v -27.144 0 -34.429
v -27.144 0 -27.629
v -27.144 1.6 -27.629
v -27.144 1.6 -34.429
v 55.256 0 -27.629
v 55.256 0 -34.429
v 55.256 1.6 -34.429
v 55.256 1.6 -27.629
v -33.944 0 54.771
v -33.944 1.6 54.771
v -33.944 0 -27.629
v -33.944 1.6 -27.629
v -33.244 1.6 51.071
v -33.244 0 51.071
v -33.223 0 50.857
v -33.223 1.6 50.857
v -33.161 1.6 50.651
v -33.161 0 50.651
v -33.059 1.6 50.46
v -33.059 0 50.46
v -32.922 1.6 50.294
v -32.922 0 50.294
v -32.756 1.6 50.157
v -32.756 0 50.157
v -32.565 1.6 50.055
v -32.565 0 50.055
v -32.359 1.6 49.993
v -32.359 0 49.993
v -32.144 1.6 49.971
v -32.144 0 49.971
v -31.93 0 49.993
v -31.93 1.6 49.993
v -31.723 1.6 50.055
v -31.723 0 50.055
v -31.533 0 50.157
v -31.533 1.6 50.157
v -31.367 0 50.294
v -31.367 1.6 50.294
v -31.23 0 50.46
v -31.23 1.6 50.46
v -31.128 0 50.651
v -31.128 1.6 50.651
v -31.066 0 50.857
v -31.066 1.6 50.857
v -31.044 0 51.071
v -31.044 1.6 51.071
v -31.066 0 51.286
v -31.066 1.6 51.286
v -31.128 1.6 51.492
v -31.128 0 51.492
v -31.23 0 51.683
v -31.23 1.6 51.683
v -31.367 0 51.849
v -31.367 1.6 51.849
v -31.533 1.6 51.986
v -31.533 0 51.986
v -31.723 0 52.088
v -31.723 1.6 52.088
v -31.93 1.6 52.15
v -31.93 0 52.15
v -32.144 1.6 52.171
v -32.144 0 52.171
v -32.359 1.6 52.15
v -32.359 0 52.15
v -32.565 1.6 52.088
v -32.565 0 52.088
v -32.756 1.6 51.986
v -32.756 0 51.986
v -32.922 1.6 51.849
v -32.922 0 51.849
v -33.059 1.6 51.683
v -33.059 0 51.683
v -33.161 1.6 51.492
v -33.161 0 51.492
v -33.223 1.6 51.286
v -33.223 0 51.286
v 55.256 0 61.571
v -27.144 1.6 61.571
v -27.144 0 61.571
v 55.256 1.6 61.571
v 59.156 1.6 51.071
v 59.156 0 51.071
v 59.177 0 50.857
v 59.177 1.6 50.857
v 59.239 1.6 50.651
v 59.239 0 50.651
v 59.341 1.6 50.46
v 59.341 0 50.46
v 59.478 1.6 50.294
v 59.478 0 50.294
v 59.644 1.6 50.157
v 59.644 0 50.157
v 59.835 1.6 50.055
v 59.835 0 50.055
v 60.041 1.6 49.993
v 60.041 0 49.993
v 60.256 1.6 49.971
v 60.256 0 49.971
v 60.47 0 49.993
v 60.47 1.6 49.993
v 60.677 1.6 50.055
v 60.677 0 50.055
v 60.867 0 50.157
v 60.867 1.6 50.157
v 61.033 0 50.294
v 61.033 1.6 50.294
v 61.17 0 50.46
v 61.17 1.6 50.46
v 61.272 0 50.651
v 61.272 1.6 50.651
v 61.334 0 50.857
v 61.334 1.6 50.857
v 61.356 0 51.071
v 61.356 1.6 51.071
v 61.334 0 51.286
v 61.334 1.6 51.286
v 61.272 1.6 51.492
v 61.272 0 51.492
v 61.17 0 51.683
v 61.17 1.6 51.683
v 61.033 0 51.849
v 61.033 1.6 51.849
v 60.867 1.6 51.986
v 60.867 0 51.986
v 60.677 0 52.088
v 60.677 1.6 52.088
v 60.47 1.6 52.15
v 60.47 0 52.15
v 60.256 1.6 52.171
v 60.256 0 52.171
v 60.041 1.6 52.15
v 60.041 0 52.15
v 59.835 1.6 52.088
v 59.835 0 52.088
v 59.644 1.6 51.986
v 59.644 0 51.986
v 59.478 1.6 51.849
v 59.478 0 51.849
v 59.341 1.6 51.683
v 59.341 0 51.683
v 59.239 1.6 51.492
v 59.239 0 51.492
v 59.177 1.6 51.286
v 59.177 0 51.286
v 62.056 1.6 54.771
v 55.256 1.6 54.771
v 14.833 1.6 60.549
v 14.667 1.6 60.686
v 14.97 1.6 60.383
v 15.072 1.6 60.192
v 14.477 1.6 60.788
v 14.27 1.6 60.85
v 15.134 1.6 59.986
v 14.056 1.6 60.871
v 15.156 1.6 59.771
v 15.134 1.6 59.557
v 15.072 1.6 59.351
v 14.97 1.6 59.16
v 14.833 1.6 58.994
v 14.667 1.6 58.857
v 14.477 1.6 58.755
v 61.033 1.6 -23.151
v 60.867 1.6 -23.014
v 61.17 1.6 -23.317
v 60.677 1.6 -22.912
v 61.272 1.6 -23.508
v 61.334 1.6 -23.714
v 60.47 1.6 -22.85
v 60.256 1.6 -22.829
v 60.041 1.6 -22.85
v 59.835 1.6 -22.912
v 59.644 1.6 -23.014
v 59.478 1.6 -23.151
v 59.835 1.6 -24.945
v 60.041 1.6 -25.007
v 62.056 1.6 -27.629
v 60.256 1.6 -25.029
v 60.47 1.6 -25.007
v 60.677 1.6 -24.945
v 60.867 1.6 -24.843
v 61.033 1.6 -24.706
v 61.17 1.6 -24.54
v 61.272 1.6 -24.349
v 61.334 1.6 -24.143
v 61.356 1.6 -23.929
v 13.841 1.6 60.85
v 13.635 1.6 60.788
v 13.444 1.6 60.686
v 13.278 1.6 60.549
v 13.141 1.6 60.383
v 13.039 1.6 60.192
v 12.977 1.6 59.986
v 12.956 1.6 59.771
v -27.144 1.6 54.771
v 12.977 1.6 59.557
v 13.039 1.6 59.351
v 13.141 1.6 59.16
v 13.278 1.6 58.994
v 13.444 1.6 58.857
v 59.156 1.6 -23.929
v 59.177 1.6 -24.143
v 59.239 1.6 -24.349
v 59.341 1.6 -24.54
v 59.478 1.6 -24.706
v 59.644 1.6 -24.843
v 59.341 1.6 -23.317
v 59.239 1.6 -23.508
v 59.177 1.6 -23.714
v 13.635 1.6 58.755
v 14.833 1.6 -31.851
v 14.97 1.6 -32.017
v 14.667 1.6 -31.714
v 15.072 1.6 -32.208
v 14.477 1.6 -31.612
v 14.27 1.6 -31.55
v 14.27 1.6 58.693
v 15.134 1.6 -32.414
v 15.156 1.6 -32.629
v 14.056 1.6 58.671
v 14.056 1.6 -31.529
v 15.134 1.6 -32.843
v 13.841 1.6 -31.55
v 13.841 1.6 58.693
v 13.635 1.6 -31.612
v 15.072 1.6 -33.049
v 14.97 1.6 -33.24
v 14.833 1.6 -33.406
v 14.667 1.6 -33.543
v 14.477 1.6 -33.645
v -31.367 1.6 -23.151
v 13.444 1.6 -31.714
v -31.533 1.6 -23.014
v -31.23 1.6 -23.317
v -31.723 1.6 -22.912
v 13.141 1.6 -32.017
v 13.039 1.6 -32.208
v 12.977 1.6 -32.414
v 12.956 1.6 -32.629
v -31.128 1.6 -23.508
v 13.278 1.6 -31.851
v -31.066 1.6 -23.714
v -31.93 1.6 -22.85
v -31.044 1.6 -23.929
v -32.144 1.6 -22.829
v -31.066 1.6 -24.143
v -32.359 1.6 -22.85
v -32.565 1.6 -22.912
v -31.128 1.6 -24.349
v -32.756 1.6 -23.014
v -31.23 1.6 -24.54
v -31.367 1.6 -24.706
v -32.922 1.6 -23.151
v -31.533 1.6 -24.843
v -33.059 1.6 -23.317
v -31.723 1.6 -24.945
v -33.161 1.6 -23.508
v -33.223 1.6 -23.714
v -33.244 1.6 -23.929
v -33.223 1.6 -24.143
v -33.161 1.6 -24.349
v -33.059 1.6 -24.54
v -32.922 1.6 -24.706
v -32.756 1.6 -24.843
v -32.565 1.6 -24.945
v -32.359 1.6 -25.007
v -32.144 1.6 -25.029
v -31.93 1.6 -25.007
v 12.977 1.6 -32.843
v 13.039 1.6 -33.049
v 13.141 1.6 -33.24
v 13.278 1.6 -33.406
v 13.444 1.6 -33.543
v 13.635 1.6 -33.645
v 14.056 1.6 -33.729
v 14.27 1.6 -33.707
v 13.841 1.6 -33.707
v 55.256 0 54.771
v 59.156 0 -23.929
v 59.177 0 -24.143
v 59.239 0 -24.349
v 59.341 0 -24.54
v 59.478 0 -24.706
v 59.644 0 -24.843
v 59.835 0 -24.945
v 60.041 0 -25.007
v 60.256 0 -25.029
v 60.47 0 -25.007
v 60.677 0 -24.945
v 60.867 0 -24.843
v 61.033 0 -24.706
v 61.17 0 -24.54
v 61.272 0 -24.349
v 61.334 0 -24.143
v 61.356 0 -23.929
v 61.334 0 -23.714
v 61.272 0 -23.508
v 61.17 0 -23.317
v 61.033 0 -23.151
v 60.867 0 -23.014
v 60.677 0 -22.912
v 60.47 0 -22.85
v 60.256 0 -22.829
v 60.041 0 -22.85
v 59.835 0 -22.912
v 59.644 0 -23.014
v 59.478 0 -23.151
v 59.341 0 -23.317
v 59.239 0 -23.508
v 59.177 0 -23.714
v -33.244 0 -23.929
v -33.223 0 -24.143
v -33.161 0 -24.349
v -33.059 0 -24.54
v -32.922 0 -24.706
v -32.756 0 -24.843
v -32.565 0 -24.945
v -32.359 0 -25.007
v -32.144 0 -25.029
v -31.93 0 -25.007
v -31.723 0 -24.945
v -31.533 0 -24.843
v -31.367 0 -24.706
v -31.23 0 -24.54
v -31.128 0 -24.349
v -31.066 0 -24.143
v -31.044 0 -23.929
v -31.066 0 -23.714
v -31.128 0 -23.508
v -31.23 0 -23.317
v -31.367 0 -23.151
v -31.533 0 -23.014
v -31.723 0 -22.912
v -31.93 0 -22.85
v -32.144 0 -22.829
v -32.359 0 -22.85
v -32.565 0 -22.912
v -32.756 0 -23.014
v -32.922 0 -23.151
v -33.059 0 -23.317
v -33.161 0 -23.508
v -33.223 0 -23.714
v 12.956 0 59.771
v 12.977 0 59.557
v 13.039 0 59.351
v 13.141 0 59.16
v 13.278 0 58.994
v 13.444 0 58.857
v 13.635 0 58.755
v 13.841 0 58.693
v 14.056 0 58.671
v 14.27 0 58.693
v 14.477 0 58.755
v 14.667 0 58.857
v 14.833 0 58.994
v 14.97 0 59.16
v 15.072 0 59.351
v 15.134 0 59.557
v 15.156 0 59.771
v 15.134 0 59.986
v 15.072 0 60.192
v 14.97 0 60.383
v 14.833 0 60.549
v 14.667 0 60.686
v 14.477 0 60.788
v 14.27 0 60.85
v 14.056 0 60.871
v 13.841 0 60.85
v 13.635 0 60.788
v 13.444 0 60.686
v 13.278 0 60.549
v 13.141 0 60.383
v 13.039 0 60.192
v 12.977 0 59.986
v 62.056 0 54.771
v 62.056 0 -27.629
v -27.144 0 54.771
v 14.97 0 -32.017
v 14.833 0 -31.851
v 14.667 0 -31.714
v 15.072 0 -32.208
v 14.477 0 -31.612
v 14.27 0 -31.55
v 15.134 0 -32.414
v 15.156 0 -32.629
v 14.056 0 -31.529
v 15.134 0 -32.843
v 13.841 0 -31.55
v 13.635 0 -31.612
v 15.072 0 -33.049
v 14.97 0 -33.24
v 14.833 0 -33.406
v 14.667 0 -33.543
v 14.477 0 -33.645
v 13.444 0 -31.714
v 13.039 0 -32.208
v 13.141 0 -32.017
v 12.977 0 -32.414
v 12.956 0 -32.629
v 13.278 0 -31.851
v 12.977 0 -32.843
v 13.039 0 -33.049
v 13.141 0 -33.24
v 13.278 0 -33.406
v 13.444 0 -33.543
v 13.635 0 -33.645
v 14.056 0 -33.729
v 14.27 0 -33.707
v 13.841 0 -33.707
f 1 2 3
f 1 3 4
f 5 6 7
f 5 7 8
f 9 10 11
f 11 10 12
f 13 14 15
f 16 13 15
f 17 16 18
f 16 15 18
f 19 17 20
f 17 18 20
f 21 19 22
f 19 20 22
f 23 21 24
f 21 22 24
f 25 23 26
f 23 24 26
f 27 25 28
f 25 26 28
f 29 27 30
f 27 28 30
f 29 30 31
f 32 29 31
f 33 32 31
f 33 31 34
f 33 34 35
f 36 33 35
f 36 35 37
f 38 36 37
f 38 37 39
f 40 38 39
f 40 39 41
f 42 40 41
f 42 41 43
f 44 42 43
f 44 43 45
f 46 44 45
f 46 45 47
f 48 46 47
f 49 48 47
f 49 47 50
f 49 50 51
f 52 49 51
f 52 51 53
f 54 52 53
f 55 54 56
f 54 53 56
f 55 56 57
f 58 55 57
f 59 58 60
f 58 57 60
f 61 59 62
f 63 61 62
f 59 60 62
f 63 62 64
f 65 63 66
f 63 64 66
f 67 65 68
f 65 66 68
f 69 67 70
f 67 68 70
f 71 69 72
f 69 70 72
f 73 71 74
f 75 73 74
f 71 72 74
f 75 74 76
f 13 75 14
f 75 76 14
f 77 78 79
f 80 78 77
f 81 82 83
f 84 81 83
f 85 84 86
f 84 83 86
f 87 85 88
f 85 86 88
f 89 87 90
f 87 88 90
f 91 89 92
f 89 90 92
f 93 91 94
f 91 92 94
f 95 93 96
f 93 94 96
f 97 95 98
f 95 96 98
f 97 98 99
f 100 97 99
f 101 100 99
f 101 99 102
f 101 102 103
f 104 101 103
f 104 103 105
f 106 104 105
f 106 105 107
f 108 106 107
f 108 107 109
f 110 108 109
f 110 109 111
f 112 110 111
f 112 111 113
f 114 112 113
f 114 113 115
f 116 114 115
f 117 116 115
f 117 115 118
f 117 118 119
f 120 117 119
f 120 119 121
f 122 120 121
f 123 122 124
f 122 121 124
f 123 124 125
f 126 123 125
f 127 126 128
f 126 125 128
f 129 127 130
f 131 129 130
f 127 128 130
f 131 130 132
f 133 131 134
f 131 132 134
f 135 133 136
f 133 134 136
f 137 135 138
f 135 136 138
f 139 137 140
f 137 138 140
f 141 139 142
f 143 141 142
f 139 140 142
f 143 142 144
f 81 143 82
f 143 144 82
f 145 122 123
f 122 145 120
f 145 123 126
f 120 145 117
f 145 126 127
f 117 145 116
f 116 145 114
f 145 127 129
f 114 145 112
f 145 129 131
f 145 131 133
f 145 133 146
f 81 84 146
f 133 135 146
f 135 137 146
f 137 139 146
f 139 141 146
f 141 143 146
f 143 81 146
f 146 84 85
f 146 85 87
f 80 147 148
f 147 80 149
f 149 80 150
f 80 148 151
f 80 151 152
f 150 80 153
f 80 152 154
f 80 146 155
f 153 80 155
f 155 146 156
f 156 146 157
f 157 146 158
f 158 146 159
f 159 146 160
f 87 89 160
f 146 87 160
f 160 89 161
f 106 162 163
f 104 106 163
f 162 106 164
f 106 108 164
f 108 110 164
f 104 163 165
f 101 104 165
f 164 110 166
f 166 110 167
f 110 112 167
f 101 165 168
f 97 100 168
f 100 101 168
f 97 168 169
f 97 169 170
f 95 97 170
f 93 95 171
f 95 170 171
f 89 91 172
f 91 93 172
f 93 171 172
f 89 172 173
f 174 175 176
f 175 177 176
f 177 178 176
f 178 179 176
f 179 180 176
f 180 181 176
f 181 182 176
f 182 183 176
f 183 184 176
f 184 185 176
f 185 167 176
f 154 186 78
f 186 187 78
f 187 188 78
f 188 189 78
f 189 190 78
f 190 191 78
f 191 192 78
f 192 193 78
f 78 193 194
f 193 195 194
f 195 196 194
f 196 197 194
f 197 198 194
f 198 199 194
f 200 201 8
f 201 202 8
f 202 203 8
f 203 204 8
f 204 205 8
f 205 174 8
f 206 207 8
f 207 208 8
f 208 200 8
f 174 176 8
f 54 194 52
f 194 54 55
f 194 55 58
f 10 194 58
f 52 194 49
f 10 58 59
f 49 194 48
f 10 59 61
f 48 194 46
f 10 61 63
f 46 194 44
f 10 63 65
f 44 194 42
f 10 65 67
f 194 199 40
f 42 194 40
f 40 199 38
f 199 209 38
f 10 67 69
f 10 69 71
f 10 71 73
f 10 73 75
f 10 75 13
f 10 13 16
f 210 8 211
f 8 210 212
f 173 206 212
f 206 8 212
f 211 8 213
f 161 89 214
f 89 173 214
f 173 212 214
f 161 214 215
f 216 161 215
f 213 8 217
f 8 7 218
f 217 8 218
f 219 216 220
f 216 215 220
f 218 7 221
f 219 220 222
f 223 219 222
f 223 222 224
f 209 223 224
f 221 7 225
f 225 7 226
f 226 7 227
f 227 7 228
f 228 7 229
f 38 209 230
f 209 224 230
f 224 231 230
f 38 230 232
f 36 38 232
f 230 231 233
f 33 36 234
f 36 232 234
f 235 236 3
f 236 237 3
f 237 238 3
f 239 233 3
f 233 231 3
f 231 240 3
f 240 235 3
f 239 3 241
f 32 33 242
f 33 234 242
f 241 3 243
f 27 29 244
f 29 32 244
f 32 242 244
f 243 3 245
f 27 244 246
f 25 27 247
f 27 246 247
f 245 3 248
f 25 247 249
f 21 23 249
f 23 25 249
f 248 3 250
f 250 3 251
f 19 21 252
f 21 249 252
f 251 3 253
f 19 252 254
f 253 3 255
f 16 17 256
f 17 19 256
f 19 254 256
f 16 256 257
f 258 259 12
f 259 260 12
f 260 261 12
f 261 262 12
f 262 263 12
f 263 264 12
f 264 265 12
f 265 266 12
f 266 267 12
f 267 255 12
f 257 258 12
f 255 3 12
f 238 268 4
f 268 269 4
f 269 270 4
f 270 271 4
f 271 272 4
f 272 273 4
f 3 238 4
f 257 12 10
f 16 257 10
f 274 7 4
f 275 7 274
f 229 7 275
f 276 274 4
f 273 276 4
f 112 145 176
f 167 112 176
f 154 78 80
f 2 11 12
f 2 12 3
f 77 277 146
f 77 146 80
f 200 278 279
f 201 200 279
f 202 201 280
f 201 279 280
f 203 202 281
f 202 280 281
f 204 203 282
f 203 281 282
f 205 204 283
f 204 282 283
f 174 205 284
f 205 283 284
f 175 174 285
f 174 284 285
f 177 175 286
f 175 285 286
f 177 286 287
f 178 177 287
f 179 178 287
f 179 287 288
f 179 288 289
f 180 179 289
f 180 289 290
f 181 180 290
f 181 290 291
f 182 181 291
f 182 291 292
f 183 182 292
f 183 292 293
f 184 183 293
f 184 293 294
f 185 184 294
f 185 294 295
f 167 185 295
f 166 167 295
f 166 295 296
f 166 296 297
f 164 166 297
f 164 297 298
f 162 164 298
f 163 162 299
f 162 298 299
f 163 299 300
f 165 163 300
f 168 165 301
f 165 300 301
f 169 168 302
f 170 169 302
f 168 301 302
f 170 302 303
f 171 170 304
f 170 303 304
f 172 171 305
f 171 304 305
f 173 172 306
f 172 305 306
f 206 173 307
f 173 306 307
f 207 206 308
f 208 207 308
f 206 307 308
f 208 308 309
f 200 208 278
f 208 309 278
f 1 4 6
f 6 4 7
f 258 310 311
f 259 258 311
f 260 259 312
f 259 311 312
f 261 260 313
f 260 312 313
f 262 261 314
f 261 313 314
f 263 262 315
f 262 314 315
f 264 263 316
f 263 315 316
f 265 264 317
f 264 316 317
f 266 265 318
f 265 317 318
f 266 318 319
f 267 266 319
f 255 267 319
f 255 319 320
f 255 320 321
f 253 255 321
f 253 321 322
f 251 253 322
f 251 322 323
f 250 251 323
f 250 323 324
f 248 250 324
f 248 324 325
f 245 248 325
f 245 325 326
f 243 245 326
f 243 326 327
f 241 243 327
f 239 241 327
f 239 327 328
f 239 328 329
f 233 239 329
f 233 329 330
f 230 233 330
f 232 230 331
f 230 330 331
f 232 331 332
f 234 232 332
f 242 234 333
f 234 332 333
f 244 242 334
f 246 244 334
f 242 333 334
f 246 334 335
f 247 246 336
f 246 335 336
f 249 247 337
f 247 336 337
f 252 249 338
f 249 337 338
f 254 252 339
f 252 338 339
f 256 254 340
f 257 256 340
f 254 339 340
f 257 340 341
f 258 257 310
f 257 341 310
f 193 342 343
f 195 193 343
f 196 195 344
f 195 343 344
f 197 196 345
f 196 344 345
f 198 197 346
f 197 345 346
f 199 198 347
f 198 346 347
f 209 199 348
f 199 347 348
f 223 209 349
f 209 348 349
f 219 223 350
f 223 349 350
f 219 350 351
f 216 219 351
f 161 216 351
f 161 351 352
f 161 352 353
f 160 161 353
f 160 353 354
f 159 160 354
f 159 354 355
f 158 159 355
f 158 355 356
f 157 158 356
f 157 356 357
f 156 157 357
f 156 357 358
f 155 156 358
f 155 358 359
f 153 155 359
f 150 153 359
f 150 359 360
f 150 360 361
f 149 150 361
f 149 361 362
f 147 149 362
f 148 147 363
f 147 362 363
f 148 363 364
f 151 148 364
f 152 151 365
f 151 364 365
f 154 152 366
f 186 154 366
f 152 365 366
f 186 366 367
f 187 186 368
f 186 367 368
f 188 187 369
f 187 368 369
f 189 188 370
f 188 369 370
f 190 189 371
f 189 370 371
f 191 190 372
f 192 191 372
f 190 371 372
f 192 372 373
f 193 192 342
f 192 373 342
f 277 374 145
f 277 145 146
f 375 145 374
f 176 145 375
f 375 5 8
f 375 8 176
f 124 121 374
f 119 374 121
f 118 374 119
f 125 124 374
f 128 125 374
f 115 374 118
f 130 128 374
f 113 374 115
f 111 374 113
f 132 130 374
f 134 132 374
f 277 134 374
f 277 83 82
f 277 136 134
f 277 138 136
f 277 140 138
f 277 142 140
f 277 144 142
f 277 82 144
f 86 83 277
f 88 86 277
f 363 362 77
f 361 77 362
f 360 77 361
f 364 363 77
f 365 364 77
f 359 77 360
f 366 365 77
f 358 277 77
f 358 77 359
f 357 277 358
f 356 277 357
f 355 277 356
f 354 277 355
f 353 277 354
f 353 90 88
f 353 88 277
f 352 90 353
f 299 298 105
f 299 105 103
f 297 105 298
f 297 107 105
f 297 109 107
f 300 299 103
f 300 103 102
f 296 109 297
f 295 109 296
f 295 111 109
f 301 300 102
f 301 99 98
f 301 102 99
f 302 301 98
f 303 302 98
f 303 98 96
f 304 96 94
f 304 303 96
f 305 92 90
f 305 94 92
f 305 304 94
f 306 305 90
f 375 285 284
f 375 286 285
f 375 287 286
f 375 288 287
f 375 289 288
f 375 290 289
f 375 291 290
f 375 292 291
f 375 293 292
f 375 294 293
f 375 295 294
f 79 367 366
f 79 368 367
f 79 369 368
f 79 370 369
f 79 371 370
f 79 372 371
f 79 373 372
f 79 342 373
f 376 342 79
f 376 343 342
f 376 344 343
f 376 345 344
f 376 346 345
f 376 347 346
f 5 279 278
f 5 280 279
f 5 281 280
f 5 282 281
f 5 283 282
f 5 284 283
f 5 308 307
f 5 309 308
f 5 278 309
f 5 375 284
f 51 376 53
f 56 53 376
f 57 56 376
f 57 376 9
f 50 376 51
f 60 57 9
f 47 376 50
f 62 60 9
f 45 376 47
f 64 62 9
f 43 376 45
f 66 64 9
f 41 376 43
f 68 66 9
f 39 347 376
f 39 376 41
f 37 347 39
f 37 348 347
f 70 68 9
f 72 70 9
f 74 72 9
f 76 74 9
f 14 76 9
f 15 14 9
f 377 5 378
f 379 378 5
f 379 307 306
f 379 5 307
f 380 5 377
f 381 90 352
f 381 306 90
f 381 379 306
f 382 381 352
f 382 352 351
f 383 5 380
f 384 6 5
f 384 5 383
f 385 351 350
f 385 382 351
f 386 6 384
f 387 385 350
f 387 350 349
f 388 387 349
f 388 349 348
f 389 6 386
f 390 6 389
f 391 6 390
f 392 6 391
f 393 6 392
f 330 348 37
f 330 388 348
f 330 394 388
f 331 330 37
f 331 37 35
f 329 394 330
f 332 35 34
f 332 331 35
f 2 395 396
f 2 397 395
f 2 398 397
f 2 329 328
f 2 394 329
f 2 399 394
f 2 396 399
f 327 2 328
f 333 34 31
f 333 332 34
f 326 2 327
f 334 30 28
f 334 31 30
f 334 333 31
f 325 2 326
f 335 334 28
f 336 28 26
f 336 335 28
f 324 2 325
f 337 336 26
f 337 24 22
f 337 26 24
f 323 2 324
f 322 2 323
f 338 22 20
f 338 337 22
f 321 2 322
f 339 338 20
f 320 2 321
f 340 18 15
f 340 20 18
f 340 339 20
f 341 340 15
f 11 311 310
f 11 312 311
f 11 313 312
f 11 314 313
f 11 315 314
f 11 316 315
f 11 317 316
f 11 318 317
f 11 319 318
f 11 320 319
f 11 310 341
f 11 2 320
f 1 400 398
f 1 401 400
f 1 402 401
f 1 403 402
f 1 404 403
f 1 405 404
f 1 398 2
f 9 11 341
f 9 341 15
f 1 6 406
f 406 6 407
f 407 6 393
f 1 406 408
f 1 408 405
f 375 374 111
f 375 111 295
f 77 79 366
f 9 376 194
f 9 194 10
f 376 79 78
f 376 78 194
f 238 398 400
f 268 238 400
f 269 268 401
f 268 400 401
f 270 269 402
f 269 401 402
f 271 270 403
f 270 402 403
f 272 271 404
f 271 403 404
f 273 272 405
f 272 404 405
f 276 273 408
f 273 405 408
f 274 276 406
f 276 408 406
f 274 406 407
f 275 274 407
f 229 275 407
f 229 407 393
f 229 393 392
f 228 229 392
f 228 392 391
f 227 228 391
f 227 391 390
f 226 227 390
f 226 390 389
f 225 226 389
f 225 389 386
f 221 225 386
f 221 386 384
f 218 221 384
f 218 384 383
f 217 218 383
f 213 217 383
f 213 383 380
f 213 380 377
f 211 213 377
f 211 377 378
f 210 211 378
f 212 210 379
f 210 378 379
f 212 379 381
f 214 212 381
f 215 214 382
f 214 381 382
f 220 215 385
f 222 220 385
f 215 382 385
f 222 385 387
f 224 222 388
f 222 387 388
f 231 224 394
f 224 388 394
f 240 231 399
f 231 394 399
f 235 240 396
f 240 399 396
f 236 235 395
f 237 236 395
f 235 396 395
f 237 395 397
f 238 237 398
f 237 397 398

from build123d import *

# Parameters (mm, degrees)
BOSS_EXTRUDE1_DEPTH            = 1.6
F_2_2_2_2_DIAMETER_HOLE1_D     = 2.2
F_2_2_2_2_DIAMETER_HOLE1_DEPTH = 5
SKETCH8_W                      = 82.4
SKETCH8_H                      = 0.2
SKETCH8_W_2                    = 0.2
SKETCH8_H_2                    = 82.4
EXTRUDE1_DEPTH                 = 2.6


with BuildPart() as part:
    # Sketch1 → Boss-Extrude1 (new body)
    with BuildSketch(Plane(origin=(0, 0, 0), x_dir=(1, 0, 0), z_dir=(0, 1, 0))):
        Polygon((-34.144384454, 27.628503563), (-27.144384454, 27.628503563), (-27.144384454, 34.628503563), (55.255615546, 34.628503563), (55.255615546, 27.628503563), (62.255615546, 27.628503563), (62.255615546, -54.771496437), (55.255615546, -54.771496437), (55.255615546, -61.771496437), (-27.144384454, -61.771496437), (-27.144384454, -54.771496437), (-34.144384454, -54.771496437), align=None)
    extrude(amount=BOSS_EXTRUDE1_DEPTH)

    # Ø2.2 (2.2) Diameter Hole1
    with Locations(Plane(origin=(0, 1.6, 0), x_dir=(1, 0, 0), z_dir=(0, 1, 0))):
        with Locations((14.055615546, 32.628503563), (14.055615546, -59.771496437), (-32.144384454, -51.071496437), (60.255615546, 23.928503563), (-32.144384454, 23.928503563), (60.255615546, -51.071496437)):
            Hole(F_2_2_2_2_DIAMETER_HOLE1_D / 2, depth=F_2_2_2_2_DIAMETER_HOLE1_DEPTH)

    # Sketch8 → Extrude1 (cut, through all)
    with BuildSketch(Plane(origin=(0, 1.6, 0), x_dir=(1, 0, 0), z_dir=(0, 1, 0))):
        with Locations((14.055615546, 34.528503563)):
            Rectangle(SKETCH8_W, SKETCH8_H)
        with Locations((62.155615546, -13.571496437)):
            Rectangle(SKETCH8_W_2, SKETCH8_H_2)
        with Locations((14.055615546, -61.671496437)):
            Rectangle(SKETCH8_W, SKETCH8_H)
        with Locations((-34.044384454, -13.571496437)):
            Rectangle(SKETCH8_W_2, SKETCH8_H_2)
    extrude(amount=-EXTRUDE1_DEPTH, mode=Mode.SUBTRACT)


solid = part.part
